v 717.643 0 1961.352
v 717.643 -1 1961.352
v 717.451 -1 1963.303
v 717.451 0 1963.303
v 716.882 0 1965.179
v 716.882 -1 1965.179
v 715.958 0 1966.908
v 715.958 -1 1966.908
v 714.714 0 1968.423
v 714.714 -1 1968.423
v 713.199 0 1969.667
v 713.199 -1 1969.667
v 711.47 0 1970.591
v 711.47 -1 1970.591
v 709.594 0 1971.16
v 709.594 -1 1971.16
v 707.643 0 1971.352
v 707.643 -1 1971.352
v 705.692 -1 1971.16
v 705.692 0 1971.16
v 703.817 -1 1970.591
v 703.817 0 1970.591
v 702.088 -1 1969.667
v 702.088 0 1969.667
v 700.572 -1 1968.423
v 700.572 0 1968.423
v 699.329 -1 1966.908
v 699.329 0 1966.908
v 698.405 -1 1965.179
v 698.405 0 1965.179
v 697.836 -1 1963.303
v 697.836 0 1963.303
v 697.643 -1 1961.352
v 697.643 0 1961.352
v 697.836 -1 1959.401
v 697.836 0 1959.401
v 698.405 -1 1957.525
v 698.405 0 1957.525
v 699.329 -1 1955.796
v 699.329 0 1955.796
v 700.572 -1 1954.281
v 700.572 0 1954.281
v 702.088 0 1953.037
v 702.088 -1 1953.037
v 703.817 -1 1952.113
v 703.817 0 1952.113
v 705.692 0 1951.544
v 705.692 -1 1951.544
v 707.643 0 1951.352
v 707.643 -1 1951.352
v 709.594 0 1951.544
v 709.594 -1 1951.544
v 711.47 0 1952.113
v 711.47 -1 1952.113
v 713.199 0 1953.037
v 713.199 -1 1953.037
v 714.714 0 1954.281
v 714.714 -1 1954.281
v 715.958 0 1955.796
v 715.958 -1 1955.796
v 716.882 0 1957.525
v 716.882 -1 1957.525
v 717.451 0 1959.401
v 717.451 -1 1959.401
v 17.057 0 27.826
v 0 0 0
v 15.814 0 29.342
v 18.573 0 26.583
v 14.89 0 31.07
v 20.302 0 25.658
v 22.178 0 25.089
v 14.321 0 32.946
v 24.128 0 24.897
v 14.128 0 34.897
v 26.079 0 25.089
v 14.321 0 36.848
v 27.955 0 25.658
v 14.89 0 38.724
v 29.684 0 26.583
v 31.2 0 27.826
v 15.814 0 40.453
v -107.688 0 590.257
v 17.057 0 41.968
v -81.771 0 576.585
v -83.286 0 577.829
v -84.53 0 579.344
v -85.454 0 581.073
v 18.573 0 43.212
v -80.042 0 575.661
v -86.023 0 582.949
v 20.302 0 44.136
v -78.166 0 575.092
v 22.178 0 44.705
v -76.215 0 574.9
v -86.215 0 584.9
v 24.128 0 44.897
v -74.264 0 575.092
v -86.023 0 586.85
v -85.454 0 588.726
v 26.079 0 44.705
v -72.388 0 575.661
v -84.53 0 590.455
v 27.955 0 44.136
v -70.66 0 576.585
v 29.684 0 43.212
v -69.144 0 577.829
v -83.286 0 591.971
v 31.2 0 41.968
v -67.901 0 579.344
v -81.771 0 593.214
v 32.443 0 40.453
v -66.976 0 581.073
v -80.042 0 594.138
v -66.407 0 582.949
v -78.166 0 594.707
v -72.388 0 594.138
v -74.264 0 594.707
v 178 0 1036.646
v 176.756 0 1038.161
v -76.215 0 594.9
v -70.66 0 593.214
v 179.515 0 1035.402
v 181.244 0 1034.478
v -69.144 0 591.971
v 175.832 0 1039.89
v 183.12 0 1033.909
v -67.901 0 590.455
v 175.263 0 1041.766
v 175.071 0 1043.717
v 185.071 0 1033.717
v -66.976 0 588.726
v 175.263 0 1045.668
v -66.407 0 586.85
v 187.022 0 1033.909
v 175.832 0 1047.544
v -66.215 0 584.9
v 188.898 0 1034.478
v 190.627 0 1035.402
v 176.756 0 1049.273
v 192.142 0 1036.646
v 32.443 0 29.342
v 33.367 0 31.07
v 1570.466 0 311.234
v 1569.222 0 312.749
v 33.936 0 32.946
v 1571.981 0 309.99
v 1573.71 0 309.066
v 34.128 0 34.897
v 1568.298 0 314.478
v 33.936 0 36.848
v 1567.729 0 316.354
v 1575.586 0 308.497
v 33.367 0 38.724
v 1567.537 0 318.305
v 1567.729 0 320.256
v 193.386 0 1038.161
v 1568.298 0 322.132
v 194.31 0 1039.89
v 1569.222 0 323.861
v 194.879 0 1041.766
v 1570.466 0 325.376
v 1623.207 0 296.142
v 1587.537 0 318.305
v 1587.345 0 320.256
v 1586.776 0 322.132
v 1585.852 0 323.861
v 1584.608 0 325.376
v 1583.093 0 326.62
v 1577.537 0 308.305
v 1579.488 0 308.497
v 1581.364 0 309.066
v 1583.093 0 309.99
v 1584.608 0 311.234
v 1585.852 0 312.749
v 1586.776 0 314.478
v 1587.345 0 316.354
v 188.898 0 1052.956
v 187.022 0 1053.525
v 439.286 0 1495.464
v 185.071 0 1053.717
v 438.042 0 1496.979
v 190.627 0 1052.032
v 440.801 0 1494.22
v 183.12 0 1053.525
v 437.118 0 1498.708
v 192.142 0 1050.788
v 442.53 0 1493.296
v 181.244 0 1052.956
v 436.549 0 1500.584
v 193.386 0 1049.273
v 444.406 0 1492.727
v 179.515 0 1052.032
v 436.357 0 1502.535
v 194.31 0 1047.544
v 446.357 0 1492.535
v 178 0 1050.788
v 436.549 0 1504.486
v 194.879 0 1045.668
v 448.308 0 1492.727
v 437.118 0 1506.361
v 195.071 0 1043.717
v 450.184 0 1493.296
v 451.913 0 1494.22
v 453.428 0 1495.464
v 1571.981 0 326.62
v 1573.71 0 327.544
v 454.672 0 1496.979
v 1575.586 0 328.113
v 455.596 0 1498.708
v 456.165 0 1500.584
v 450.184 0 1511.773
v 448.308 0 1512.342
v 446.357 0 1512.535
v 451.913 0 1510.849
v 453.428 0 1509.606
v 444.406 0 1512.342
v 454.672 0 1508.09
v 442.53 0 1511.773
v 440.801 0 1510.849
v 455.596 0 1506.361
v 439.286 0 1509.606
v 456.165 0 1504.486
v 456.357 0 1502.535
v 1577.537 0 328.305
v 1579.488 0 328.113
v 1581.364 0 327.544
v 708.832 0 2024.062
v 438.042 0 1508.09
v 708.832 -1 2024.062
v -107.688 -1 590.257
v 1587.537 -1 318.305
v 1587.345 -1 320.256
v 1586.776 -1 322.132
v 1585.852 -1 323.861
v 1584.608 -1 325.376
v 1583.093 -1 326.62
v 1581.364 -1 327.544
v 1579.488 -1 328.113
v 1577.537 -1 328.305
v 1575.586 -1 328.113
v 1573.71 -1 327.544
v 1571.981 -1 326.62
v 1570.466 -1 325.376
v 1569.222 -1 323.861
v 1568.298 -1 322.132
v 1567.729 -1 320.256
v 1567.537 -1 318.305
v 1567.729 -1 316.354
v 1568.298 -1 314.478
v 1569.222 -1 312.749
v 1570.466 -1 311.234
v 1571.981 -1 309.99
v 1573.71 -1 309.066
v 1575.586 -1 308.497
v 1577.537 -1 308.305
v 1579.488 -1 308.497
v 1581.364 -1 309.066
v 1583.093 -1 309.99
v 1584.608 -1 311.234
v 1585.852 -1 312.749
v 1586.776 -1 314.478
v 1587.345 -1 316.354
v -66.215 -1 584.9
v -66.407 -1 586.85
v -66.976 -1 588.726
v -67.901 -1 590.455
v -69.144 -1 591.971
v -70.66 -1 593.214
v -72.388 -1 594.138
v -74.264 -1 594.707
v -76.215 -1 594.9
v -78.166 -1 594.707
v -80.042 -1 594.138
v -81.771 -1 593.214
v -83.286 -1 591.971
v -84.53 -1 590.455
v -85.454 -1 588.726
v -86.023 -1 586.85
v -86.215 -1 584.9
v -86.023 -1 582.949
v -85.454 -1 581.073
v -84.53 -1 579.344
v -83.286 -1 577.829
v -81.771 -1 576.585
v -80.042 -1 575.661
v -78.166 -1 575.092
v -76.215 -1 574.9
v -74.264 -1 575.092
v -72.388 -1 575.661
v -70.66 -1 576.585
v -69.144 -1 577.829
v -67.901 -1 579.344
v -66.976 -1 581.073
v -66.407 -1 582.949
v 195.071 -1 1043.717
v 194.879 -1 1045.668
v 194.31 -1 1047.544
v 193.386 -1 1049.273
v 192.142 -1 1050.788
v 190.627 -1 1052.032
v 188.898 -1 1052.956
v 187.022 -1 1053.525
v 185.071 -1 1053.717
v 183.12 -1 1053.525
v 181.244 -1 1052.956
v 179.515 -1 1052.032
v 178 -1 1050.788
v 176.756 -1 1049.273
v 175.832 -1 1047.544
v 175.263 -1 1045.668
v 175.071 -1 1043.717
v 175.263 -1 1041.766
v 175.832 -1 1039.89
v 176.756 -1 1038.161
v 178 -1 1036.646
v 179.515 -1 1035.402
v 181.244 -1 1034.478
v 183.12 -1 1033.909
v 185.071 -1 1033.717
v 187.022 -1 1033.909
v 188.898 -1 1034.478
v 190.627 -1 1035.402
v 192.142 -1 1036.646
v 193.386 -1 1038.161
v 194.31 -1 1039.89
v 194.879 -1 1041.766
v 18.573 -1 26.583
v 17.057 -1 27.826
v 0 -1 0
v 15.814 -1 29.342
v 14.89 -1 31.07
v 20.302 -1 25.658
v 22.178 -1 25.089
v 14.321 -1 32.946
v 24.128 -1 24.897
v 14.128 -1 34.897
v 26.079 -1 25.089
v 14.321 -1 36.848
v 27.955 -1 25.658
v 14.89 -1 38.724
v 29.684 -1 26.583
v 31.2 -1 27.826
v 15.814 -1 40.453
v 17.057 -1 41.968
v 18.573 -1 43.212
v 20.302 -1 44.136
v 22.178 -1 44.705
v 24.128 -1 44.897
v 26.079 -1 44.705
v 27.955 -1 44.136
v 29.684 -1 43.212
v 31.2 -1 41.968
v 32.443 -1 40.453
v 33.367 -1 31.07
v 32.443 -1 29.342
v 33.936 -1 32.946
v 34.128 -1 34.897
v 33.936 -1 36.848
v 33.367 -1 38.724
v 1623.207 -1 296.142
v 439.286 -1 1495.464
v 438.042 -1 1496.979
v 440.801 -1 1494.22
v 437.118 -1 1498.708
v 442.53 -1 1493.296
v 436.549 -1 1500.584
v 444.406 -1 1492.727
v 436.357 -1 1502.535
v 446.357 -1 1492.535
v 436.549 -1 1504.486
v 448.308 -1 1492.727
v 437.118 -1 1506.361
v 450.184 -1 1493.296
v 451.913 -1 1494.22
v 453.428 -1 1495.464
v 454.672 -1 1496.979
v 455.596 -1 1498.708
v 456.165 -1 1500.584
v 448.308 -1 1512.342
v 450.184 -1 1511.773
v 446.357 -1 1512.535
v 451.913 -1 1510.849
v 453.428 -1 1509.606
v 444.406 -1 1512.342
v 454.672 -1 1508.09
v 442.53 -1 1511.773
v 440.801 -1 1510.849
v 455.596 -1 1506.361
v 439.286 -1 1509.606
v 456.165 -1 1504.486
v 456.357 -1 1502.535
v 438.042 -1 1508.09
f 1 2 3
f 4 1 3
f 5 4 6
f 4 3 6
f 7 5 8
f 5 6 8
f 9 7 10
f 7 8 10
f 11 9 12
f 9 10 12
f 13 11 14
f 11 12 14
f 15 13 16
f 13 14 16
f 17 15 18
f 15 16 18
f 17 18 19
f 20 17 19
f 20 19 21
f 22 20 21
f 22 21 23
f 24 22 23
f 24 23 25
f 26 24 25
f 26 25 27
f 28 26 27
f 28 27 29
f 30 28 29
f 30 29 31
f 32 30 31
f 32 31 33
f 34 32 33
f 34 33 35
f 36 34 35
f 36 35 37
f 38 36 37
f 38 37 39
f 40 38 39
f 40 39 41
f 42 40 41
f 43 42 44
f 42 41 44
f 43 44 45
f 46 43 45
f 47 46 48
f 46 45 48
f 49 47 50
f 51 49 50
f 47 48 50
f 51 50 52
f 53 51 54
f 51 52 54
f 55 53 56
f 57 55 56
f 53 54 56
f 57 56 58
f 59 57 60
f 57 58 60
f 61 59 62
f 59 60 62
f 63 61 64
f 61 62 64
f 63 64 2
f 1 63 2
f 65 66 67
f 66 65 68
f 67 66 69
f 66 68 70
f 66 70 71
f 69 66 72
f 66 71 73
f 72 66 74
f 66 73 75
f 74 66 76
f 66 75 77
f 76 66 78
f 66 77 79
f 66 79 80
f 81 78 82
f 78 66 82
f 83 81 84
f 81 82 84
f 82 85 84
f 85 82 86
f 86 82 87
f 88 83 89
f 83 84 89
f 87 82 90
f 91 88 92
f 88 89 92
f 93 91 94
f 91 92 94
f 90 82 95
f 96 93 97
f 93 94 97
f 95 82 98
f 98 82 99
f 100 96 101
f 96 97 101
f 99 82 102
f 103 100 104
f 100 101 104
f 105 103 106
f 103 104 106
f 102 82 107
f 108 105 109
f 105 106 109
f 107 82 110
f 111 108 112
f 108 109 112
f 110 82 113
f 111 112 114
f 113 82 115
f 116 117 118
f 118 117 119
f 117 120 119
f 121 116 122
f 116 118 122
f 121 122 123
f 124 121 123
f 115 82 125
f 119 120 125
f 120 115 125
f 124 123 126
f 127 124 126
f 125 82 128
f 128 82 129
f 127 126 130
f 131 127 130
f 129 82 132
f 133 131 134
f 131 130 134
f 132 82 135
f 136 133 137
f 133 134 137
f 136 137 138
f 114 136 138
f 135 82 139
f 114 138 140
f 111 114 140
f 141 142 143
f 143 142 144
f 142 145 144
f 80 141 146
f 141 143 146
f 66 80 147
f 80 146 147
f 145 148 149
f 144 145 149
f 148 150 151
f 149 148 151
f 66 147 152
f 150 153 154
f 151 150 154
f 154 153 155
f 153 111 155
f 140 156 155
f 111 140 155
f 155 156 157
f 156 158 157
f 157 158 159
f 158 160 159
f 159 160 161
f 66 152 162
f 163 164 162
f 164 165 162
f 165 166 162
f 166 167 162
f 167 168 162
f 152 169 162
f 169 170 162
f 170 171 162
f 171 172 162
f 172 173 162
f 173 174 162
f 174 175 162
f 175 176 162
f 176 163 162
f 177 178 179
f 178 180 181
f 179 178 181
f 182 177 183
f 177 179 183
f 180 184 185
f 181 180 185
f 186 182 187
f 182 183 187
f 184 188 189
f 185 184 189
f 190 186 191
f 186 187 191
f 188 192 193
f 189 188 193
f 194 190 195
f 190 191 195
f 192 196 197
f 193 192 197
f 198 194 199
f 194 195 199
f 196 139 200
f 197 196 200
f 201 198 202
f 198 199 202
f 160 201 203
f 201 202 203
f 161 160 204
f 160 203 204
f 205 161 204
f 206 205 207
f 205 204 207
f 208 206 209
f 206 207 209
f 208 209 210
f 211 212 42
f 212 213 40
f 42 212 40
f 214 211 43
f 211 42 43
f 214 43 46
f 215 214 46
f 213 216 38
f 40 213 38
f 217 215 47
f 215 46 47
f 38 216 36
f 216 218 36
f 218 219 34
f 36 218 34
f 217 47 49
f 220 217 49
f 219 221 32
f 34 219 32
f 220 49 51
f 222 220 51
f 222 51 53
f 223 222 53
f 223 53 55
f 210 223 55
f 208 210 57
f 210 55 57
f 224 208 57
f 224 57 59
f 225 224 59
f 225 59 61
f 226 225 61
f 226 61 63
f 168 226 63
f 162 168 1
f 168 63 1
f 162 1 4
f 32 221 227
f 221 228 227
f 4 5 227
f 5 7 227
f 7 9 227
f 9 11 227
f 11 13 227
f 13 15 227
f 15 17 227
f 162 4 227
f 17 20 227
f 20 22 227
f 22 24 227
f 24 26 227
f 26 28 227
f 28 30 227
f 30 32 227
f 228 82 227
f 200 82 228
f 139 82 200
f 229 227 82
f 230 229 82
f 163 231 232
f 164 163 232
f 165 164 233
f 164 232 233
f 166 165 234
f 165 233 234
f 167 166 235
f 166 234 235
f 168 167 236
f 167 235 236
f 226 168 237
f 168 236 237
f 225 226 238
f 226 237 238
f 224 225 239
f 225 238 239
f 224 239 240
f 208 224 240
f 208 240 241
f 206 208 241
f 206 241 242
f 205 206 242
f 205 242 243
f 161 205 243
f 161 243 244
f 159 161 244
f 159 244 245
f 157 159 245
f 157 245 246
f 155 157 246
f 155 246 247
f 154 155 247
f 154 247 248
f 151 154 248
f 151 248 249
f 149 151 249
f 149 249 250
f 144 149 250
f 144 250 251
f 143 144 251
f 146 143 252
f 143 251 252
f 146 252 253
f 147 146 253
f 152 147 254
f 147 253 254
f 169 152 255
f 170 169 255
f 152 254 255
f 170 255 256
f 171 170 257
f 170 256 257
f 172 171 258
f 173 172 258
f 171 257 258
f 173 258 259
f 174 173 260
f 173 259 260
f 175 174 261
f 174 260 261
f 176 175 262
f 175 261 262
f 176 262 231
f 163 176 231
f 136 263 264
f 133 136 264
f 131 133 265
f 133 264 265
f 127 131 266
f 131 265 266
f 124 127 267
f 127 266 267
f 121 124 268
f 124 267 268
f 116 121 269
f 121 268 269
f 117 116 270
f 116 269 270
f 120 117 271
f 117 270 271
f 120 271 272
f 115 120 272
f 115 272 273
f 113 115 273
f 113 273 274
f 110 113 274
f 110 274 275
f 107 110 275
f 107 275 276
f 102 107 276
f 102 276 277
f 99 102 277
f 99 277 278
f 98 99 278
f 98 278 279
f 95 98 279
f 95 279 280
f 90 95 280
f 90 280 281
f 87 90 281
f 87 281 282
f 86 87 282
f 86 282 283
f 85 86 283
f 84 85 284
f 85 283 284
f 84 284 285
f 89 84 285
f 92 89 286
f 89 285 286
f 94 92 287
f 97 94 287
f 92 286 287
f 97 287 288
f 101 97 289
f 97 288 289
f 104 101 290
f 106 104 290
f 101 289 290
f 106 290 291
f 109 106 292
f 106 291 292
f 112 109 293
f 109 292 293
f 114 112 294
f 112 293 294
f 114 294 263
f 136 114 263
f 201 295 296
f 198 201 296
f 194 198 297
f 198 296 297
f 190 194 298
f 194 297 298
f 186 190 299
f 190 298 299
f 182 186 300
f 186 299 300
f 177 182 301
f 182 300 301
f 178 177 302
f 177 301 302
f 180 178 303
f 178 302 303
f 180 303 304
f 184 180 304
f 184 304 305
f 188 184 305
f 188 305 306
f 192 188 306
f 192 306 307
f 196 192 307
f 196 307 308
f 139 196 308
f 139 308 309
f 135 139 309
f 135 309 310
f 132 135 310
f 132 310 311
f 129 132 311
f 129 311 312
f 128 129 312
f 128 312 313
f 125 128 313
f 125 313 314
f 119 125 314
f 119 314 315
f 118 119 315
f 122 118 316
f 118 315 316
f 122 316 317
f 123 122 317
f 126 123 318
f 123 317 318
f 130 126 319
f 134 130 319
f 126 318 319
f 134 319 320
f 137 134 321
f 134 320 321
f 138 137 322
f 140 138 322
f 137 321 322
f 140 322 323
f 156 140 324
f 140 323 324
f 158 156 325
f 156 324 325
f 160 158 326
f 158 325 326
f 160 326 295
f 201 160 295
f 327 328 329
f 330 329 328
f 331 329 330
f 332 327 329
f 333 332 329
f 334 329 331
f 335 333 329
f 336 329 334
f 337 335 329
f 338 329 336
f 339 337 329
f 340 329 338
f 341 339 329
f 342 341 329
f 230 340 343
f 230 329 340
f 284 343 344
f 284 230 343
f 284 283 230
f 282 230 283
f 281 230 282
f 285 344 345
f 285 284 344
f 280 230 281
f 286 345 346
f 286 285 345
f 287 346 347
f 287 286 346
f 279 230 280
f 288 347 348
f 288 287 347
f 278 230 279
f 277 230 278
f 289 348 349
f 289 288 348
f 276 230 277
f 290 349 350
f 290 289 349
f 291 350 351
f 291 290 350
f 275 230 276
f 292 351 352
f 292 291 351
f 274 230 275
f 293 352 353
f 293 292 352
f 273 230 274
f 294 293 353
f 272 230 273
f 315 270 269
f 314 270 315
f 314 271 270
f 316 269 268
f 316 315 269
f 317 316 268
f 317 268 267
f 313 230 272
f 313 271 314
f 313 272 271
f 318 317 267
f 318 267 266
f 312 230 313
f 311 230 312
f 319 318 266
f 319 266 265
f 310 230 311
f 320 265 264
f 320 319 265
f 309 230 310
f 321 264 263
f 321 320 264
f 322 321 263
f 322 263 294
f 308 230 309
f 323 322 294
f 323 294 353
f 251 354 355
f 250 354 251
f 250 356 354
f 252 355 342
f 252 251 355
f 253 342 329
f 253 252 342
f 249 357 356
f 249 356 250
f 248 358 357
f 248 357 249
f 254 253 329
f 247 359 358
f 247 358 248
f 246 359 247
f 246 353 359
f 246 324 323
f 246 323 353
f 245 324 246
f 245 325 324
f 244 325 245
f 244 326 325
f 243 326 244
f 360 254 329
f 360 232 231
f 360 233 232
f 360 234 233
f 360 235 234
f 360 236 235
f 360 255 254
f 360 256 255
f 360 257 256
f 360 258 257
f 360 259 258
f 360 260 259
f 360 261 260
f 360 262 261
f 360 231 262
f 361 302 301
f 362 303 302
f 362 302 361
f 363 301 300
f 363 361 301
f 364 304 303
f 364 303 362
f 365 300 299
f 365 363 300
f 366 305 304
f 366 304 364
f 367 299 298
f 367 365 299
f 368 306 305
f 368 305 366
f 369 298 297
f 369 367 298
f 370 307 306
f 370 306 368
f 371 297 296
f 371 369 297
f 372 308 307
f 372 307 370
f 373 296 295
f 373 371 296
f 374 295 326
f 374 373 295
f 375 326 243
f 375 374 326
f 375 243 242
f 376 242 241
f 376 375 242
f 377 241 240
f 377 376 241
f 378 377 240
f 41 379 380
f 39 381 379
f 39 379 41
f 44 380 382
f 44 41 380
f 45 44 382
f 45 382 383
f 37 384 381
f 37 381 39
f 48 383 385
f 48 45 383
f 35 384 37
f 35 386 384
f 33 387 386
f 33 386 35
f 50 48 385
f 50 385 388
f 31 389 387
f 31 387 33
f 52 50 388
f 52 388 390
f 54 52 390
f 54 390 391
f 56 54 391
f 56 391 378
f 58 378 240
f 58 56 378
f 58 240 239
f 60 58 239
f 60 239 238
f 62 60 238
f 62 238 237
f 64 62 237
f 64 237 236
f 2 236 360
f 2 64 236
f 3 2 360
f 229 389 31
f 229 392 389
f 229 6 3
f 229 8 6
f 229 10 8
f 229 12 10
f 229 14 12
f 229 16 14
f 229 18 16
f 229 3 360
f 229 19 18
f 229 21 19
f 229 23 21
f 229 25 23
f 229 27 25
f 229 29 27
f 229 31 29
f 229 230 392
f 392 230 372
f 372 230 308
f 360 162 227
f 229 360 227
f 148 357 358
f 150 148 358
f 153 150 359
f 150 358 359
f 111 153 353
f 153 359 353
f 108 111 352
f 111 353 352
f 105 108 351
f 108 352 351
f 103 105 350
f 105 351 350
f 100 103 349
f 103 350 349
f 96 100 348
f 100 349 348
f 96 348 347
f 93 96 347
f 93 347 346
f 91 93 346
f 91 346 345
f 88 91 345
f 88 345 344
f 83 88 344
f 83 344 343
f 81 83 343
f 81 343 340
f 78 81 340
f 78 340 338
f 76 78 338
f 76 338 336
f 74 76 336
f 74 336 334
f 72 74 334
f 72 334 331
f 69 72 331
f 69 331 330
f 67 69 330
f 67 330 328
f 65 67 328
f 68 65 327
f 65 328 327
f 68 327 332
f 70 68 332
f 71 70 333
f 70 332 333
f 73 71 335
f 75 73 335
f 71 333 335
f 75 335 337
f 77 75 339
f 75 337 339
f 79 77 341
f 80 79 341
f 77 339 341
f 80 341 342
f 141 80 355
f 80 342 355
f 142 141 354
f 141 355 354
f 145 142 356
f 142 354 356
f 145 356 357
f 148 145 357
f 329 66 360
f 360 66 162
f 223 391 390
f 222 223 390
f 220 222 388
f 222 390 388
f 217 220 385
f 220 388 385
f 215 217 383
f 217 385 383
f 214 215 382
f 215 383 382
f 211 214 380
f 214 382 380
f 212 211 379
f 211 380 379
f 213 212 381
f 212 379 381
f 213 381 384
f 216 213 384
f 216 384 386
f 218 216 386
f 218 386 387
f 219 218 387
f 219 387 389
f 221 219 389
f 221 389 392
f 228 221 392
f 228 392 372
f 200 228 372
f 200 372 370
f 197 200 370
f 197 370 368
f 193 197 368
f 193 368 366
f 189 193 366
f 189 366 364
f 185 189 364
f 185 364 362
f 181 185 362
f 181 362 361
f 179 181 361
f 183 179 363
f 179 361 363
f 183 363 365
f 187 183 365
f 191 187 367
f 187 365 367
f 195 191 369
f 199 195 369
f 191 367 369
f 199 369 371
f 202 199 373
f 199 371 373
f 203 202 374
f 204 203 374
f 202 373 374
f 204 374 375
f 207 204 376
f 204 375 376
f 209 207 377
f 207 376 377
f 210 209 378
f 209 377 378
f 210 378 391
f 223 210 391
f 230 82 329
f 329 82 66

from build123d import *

# Parameters (mm, degrees)
F1_DEPTH = 1
F2_R     = 10
F3_DEPTH = 1.001


with BuildPart() as f1:
    # F0 (on Front) → F1 (new body)
    with BuildSketch(Plane.XZ):
        Polygon((-107.687899, 590.256992), (0, 0), (1623.206728, 296.141721), (708.831554, 2024.061715), align=None)
    extrude(amount=F1_DEPTH)

    # F2 (on face) → F3 (cut, through all)
    with BuildSketch(Plane.XZ.offset(1)):
        with Locations((-76.215289, 584.899588)):
            Circle(F2_R)
        with Locations((185.070935, 1043.717099)):
            Circle(F2_R)
        with Locations((446.35716, 1502.534611)):
            Circle(F2_R)
        with Locations((707.643385, 1961.352122)):
            Circle(F2_R)
        with Locations((24.128455, 34.897245)):
            Circle(F2_R)
        with Locations((1577.53703, 318.304824)):
            Circle(F2_R)
    extrude(amount=-F3_DEPTH, mode=Mode.SUBTRACT)


solid = f1.part
